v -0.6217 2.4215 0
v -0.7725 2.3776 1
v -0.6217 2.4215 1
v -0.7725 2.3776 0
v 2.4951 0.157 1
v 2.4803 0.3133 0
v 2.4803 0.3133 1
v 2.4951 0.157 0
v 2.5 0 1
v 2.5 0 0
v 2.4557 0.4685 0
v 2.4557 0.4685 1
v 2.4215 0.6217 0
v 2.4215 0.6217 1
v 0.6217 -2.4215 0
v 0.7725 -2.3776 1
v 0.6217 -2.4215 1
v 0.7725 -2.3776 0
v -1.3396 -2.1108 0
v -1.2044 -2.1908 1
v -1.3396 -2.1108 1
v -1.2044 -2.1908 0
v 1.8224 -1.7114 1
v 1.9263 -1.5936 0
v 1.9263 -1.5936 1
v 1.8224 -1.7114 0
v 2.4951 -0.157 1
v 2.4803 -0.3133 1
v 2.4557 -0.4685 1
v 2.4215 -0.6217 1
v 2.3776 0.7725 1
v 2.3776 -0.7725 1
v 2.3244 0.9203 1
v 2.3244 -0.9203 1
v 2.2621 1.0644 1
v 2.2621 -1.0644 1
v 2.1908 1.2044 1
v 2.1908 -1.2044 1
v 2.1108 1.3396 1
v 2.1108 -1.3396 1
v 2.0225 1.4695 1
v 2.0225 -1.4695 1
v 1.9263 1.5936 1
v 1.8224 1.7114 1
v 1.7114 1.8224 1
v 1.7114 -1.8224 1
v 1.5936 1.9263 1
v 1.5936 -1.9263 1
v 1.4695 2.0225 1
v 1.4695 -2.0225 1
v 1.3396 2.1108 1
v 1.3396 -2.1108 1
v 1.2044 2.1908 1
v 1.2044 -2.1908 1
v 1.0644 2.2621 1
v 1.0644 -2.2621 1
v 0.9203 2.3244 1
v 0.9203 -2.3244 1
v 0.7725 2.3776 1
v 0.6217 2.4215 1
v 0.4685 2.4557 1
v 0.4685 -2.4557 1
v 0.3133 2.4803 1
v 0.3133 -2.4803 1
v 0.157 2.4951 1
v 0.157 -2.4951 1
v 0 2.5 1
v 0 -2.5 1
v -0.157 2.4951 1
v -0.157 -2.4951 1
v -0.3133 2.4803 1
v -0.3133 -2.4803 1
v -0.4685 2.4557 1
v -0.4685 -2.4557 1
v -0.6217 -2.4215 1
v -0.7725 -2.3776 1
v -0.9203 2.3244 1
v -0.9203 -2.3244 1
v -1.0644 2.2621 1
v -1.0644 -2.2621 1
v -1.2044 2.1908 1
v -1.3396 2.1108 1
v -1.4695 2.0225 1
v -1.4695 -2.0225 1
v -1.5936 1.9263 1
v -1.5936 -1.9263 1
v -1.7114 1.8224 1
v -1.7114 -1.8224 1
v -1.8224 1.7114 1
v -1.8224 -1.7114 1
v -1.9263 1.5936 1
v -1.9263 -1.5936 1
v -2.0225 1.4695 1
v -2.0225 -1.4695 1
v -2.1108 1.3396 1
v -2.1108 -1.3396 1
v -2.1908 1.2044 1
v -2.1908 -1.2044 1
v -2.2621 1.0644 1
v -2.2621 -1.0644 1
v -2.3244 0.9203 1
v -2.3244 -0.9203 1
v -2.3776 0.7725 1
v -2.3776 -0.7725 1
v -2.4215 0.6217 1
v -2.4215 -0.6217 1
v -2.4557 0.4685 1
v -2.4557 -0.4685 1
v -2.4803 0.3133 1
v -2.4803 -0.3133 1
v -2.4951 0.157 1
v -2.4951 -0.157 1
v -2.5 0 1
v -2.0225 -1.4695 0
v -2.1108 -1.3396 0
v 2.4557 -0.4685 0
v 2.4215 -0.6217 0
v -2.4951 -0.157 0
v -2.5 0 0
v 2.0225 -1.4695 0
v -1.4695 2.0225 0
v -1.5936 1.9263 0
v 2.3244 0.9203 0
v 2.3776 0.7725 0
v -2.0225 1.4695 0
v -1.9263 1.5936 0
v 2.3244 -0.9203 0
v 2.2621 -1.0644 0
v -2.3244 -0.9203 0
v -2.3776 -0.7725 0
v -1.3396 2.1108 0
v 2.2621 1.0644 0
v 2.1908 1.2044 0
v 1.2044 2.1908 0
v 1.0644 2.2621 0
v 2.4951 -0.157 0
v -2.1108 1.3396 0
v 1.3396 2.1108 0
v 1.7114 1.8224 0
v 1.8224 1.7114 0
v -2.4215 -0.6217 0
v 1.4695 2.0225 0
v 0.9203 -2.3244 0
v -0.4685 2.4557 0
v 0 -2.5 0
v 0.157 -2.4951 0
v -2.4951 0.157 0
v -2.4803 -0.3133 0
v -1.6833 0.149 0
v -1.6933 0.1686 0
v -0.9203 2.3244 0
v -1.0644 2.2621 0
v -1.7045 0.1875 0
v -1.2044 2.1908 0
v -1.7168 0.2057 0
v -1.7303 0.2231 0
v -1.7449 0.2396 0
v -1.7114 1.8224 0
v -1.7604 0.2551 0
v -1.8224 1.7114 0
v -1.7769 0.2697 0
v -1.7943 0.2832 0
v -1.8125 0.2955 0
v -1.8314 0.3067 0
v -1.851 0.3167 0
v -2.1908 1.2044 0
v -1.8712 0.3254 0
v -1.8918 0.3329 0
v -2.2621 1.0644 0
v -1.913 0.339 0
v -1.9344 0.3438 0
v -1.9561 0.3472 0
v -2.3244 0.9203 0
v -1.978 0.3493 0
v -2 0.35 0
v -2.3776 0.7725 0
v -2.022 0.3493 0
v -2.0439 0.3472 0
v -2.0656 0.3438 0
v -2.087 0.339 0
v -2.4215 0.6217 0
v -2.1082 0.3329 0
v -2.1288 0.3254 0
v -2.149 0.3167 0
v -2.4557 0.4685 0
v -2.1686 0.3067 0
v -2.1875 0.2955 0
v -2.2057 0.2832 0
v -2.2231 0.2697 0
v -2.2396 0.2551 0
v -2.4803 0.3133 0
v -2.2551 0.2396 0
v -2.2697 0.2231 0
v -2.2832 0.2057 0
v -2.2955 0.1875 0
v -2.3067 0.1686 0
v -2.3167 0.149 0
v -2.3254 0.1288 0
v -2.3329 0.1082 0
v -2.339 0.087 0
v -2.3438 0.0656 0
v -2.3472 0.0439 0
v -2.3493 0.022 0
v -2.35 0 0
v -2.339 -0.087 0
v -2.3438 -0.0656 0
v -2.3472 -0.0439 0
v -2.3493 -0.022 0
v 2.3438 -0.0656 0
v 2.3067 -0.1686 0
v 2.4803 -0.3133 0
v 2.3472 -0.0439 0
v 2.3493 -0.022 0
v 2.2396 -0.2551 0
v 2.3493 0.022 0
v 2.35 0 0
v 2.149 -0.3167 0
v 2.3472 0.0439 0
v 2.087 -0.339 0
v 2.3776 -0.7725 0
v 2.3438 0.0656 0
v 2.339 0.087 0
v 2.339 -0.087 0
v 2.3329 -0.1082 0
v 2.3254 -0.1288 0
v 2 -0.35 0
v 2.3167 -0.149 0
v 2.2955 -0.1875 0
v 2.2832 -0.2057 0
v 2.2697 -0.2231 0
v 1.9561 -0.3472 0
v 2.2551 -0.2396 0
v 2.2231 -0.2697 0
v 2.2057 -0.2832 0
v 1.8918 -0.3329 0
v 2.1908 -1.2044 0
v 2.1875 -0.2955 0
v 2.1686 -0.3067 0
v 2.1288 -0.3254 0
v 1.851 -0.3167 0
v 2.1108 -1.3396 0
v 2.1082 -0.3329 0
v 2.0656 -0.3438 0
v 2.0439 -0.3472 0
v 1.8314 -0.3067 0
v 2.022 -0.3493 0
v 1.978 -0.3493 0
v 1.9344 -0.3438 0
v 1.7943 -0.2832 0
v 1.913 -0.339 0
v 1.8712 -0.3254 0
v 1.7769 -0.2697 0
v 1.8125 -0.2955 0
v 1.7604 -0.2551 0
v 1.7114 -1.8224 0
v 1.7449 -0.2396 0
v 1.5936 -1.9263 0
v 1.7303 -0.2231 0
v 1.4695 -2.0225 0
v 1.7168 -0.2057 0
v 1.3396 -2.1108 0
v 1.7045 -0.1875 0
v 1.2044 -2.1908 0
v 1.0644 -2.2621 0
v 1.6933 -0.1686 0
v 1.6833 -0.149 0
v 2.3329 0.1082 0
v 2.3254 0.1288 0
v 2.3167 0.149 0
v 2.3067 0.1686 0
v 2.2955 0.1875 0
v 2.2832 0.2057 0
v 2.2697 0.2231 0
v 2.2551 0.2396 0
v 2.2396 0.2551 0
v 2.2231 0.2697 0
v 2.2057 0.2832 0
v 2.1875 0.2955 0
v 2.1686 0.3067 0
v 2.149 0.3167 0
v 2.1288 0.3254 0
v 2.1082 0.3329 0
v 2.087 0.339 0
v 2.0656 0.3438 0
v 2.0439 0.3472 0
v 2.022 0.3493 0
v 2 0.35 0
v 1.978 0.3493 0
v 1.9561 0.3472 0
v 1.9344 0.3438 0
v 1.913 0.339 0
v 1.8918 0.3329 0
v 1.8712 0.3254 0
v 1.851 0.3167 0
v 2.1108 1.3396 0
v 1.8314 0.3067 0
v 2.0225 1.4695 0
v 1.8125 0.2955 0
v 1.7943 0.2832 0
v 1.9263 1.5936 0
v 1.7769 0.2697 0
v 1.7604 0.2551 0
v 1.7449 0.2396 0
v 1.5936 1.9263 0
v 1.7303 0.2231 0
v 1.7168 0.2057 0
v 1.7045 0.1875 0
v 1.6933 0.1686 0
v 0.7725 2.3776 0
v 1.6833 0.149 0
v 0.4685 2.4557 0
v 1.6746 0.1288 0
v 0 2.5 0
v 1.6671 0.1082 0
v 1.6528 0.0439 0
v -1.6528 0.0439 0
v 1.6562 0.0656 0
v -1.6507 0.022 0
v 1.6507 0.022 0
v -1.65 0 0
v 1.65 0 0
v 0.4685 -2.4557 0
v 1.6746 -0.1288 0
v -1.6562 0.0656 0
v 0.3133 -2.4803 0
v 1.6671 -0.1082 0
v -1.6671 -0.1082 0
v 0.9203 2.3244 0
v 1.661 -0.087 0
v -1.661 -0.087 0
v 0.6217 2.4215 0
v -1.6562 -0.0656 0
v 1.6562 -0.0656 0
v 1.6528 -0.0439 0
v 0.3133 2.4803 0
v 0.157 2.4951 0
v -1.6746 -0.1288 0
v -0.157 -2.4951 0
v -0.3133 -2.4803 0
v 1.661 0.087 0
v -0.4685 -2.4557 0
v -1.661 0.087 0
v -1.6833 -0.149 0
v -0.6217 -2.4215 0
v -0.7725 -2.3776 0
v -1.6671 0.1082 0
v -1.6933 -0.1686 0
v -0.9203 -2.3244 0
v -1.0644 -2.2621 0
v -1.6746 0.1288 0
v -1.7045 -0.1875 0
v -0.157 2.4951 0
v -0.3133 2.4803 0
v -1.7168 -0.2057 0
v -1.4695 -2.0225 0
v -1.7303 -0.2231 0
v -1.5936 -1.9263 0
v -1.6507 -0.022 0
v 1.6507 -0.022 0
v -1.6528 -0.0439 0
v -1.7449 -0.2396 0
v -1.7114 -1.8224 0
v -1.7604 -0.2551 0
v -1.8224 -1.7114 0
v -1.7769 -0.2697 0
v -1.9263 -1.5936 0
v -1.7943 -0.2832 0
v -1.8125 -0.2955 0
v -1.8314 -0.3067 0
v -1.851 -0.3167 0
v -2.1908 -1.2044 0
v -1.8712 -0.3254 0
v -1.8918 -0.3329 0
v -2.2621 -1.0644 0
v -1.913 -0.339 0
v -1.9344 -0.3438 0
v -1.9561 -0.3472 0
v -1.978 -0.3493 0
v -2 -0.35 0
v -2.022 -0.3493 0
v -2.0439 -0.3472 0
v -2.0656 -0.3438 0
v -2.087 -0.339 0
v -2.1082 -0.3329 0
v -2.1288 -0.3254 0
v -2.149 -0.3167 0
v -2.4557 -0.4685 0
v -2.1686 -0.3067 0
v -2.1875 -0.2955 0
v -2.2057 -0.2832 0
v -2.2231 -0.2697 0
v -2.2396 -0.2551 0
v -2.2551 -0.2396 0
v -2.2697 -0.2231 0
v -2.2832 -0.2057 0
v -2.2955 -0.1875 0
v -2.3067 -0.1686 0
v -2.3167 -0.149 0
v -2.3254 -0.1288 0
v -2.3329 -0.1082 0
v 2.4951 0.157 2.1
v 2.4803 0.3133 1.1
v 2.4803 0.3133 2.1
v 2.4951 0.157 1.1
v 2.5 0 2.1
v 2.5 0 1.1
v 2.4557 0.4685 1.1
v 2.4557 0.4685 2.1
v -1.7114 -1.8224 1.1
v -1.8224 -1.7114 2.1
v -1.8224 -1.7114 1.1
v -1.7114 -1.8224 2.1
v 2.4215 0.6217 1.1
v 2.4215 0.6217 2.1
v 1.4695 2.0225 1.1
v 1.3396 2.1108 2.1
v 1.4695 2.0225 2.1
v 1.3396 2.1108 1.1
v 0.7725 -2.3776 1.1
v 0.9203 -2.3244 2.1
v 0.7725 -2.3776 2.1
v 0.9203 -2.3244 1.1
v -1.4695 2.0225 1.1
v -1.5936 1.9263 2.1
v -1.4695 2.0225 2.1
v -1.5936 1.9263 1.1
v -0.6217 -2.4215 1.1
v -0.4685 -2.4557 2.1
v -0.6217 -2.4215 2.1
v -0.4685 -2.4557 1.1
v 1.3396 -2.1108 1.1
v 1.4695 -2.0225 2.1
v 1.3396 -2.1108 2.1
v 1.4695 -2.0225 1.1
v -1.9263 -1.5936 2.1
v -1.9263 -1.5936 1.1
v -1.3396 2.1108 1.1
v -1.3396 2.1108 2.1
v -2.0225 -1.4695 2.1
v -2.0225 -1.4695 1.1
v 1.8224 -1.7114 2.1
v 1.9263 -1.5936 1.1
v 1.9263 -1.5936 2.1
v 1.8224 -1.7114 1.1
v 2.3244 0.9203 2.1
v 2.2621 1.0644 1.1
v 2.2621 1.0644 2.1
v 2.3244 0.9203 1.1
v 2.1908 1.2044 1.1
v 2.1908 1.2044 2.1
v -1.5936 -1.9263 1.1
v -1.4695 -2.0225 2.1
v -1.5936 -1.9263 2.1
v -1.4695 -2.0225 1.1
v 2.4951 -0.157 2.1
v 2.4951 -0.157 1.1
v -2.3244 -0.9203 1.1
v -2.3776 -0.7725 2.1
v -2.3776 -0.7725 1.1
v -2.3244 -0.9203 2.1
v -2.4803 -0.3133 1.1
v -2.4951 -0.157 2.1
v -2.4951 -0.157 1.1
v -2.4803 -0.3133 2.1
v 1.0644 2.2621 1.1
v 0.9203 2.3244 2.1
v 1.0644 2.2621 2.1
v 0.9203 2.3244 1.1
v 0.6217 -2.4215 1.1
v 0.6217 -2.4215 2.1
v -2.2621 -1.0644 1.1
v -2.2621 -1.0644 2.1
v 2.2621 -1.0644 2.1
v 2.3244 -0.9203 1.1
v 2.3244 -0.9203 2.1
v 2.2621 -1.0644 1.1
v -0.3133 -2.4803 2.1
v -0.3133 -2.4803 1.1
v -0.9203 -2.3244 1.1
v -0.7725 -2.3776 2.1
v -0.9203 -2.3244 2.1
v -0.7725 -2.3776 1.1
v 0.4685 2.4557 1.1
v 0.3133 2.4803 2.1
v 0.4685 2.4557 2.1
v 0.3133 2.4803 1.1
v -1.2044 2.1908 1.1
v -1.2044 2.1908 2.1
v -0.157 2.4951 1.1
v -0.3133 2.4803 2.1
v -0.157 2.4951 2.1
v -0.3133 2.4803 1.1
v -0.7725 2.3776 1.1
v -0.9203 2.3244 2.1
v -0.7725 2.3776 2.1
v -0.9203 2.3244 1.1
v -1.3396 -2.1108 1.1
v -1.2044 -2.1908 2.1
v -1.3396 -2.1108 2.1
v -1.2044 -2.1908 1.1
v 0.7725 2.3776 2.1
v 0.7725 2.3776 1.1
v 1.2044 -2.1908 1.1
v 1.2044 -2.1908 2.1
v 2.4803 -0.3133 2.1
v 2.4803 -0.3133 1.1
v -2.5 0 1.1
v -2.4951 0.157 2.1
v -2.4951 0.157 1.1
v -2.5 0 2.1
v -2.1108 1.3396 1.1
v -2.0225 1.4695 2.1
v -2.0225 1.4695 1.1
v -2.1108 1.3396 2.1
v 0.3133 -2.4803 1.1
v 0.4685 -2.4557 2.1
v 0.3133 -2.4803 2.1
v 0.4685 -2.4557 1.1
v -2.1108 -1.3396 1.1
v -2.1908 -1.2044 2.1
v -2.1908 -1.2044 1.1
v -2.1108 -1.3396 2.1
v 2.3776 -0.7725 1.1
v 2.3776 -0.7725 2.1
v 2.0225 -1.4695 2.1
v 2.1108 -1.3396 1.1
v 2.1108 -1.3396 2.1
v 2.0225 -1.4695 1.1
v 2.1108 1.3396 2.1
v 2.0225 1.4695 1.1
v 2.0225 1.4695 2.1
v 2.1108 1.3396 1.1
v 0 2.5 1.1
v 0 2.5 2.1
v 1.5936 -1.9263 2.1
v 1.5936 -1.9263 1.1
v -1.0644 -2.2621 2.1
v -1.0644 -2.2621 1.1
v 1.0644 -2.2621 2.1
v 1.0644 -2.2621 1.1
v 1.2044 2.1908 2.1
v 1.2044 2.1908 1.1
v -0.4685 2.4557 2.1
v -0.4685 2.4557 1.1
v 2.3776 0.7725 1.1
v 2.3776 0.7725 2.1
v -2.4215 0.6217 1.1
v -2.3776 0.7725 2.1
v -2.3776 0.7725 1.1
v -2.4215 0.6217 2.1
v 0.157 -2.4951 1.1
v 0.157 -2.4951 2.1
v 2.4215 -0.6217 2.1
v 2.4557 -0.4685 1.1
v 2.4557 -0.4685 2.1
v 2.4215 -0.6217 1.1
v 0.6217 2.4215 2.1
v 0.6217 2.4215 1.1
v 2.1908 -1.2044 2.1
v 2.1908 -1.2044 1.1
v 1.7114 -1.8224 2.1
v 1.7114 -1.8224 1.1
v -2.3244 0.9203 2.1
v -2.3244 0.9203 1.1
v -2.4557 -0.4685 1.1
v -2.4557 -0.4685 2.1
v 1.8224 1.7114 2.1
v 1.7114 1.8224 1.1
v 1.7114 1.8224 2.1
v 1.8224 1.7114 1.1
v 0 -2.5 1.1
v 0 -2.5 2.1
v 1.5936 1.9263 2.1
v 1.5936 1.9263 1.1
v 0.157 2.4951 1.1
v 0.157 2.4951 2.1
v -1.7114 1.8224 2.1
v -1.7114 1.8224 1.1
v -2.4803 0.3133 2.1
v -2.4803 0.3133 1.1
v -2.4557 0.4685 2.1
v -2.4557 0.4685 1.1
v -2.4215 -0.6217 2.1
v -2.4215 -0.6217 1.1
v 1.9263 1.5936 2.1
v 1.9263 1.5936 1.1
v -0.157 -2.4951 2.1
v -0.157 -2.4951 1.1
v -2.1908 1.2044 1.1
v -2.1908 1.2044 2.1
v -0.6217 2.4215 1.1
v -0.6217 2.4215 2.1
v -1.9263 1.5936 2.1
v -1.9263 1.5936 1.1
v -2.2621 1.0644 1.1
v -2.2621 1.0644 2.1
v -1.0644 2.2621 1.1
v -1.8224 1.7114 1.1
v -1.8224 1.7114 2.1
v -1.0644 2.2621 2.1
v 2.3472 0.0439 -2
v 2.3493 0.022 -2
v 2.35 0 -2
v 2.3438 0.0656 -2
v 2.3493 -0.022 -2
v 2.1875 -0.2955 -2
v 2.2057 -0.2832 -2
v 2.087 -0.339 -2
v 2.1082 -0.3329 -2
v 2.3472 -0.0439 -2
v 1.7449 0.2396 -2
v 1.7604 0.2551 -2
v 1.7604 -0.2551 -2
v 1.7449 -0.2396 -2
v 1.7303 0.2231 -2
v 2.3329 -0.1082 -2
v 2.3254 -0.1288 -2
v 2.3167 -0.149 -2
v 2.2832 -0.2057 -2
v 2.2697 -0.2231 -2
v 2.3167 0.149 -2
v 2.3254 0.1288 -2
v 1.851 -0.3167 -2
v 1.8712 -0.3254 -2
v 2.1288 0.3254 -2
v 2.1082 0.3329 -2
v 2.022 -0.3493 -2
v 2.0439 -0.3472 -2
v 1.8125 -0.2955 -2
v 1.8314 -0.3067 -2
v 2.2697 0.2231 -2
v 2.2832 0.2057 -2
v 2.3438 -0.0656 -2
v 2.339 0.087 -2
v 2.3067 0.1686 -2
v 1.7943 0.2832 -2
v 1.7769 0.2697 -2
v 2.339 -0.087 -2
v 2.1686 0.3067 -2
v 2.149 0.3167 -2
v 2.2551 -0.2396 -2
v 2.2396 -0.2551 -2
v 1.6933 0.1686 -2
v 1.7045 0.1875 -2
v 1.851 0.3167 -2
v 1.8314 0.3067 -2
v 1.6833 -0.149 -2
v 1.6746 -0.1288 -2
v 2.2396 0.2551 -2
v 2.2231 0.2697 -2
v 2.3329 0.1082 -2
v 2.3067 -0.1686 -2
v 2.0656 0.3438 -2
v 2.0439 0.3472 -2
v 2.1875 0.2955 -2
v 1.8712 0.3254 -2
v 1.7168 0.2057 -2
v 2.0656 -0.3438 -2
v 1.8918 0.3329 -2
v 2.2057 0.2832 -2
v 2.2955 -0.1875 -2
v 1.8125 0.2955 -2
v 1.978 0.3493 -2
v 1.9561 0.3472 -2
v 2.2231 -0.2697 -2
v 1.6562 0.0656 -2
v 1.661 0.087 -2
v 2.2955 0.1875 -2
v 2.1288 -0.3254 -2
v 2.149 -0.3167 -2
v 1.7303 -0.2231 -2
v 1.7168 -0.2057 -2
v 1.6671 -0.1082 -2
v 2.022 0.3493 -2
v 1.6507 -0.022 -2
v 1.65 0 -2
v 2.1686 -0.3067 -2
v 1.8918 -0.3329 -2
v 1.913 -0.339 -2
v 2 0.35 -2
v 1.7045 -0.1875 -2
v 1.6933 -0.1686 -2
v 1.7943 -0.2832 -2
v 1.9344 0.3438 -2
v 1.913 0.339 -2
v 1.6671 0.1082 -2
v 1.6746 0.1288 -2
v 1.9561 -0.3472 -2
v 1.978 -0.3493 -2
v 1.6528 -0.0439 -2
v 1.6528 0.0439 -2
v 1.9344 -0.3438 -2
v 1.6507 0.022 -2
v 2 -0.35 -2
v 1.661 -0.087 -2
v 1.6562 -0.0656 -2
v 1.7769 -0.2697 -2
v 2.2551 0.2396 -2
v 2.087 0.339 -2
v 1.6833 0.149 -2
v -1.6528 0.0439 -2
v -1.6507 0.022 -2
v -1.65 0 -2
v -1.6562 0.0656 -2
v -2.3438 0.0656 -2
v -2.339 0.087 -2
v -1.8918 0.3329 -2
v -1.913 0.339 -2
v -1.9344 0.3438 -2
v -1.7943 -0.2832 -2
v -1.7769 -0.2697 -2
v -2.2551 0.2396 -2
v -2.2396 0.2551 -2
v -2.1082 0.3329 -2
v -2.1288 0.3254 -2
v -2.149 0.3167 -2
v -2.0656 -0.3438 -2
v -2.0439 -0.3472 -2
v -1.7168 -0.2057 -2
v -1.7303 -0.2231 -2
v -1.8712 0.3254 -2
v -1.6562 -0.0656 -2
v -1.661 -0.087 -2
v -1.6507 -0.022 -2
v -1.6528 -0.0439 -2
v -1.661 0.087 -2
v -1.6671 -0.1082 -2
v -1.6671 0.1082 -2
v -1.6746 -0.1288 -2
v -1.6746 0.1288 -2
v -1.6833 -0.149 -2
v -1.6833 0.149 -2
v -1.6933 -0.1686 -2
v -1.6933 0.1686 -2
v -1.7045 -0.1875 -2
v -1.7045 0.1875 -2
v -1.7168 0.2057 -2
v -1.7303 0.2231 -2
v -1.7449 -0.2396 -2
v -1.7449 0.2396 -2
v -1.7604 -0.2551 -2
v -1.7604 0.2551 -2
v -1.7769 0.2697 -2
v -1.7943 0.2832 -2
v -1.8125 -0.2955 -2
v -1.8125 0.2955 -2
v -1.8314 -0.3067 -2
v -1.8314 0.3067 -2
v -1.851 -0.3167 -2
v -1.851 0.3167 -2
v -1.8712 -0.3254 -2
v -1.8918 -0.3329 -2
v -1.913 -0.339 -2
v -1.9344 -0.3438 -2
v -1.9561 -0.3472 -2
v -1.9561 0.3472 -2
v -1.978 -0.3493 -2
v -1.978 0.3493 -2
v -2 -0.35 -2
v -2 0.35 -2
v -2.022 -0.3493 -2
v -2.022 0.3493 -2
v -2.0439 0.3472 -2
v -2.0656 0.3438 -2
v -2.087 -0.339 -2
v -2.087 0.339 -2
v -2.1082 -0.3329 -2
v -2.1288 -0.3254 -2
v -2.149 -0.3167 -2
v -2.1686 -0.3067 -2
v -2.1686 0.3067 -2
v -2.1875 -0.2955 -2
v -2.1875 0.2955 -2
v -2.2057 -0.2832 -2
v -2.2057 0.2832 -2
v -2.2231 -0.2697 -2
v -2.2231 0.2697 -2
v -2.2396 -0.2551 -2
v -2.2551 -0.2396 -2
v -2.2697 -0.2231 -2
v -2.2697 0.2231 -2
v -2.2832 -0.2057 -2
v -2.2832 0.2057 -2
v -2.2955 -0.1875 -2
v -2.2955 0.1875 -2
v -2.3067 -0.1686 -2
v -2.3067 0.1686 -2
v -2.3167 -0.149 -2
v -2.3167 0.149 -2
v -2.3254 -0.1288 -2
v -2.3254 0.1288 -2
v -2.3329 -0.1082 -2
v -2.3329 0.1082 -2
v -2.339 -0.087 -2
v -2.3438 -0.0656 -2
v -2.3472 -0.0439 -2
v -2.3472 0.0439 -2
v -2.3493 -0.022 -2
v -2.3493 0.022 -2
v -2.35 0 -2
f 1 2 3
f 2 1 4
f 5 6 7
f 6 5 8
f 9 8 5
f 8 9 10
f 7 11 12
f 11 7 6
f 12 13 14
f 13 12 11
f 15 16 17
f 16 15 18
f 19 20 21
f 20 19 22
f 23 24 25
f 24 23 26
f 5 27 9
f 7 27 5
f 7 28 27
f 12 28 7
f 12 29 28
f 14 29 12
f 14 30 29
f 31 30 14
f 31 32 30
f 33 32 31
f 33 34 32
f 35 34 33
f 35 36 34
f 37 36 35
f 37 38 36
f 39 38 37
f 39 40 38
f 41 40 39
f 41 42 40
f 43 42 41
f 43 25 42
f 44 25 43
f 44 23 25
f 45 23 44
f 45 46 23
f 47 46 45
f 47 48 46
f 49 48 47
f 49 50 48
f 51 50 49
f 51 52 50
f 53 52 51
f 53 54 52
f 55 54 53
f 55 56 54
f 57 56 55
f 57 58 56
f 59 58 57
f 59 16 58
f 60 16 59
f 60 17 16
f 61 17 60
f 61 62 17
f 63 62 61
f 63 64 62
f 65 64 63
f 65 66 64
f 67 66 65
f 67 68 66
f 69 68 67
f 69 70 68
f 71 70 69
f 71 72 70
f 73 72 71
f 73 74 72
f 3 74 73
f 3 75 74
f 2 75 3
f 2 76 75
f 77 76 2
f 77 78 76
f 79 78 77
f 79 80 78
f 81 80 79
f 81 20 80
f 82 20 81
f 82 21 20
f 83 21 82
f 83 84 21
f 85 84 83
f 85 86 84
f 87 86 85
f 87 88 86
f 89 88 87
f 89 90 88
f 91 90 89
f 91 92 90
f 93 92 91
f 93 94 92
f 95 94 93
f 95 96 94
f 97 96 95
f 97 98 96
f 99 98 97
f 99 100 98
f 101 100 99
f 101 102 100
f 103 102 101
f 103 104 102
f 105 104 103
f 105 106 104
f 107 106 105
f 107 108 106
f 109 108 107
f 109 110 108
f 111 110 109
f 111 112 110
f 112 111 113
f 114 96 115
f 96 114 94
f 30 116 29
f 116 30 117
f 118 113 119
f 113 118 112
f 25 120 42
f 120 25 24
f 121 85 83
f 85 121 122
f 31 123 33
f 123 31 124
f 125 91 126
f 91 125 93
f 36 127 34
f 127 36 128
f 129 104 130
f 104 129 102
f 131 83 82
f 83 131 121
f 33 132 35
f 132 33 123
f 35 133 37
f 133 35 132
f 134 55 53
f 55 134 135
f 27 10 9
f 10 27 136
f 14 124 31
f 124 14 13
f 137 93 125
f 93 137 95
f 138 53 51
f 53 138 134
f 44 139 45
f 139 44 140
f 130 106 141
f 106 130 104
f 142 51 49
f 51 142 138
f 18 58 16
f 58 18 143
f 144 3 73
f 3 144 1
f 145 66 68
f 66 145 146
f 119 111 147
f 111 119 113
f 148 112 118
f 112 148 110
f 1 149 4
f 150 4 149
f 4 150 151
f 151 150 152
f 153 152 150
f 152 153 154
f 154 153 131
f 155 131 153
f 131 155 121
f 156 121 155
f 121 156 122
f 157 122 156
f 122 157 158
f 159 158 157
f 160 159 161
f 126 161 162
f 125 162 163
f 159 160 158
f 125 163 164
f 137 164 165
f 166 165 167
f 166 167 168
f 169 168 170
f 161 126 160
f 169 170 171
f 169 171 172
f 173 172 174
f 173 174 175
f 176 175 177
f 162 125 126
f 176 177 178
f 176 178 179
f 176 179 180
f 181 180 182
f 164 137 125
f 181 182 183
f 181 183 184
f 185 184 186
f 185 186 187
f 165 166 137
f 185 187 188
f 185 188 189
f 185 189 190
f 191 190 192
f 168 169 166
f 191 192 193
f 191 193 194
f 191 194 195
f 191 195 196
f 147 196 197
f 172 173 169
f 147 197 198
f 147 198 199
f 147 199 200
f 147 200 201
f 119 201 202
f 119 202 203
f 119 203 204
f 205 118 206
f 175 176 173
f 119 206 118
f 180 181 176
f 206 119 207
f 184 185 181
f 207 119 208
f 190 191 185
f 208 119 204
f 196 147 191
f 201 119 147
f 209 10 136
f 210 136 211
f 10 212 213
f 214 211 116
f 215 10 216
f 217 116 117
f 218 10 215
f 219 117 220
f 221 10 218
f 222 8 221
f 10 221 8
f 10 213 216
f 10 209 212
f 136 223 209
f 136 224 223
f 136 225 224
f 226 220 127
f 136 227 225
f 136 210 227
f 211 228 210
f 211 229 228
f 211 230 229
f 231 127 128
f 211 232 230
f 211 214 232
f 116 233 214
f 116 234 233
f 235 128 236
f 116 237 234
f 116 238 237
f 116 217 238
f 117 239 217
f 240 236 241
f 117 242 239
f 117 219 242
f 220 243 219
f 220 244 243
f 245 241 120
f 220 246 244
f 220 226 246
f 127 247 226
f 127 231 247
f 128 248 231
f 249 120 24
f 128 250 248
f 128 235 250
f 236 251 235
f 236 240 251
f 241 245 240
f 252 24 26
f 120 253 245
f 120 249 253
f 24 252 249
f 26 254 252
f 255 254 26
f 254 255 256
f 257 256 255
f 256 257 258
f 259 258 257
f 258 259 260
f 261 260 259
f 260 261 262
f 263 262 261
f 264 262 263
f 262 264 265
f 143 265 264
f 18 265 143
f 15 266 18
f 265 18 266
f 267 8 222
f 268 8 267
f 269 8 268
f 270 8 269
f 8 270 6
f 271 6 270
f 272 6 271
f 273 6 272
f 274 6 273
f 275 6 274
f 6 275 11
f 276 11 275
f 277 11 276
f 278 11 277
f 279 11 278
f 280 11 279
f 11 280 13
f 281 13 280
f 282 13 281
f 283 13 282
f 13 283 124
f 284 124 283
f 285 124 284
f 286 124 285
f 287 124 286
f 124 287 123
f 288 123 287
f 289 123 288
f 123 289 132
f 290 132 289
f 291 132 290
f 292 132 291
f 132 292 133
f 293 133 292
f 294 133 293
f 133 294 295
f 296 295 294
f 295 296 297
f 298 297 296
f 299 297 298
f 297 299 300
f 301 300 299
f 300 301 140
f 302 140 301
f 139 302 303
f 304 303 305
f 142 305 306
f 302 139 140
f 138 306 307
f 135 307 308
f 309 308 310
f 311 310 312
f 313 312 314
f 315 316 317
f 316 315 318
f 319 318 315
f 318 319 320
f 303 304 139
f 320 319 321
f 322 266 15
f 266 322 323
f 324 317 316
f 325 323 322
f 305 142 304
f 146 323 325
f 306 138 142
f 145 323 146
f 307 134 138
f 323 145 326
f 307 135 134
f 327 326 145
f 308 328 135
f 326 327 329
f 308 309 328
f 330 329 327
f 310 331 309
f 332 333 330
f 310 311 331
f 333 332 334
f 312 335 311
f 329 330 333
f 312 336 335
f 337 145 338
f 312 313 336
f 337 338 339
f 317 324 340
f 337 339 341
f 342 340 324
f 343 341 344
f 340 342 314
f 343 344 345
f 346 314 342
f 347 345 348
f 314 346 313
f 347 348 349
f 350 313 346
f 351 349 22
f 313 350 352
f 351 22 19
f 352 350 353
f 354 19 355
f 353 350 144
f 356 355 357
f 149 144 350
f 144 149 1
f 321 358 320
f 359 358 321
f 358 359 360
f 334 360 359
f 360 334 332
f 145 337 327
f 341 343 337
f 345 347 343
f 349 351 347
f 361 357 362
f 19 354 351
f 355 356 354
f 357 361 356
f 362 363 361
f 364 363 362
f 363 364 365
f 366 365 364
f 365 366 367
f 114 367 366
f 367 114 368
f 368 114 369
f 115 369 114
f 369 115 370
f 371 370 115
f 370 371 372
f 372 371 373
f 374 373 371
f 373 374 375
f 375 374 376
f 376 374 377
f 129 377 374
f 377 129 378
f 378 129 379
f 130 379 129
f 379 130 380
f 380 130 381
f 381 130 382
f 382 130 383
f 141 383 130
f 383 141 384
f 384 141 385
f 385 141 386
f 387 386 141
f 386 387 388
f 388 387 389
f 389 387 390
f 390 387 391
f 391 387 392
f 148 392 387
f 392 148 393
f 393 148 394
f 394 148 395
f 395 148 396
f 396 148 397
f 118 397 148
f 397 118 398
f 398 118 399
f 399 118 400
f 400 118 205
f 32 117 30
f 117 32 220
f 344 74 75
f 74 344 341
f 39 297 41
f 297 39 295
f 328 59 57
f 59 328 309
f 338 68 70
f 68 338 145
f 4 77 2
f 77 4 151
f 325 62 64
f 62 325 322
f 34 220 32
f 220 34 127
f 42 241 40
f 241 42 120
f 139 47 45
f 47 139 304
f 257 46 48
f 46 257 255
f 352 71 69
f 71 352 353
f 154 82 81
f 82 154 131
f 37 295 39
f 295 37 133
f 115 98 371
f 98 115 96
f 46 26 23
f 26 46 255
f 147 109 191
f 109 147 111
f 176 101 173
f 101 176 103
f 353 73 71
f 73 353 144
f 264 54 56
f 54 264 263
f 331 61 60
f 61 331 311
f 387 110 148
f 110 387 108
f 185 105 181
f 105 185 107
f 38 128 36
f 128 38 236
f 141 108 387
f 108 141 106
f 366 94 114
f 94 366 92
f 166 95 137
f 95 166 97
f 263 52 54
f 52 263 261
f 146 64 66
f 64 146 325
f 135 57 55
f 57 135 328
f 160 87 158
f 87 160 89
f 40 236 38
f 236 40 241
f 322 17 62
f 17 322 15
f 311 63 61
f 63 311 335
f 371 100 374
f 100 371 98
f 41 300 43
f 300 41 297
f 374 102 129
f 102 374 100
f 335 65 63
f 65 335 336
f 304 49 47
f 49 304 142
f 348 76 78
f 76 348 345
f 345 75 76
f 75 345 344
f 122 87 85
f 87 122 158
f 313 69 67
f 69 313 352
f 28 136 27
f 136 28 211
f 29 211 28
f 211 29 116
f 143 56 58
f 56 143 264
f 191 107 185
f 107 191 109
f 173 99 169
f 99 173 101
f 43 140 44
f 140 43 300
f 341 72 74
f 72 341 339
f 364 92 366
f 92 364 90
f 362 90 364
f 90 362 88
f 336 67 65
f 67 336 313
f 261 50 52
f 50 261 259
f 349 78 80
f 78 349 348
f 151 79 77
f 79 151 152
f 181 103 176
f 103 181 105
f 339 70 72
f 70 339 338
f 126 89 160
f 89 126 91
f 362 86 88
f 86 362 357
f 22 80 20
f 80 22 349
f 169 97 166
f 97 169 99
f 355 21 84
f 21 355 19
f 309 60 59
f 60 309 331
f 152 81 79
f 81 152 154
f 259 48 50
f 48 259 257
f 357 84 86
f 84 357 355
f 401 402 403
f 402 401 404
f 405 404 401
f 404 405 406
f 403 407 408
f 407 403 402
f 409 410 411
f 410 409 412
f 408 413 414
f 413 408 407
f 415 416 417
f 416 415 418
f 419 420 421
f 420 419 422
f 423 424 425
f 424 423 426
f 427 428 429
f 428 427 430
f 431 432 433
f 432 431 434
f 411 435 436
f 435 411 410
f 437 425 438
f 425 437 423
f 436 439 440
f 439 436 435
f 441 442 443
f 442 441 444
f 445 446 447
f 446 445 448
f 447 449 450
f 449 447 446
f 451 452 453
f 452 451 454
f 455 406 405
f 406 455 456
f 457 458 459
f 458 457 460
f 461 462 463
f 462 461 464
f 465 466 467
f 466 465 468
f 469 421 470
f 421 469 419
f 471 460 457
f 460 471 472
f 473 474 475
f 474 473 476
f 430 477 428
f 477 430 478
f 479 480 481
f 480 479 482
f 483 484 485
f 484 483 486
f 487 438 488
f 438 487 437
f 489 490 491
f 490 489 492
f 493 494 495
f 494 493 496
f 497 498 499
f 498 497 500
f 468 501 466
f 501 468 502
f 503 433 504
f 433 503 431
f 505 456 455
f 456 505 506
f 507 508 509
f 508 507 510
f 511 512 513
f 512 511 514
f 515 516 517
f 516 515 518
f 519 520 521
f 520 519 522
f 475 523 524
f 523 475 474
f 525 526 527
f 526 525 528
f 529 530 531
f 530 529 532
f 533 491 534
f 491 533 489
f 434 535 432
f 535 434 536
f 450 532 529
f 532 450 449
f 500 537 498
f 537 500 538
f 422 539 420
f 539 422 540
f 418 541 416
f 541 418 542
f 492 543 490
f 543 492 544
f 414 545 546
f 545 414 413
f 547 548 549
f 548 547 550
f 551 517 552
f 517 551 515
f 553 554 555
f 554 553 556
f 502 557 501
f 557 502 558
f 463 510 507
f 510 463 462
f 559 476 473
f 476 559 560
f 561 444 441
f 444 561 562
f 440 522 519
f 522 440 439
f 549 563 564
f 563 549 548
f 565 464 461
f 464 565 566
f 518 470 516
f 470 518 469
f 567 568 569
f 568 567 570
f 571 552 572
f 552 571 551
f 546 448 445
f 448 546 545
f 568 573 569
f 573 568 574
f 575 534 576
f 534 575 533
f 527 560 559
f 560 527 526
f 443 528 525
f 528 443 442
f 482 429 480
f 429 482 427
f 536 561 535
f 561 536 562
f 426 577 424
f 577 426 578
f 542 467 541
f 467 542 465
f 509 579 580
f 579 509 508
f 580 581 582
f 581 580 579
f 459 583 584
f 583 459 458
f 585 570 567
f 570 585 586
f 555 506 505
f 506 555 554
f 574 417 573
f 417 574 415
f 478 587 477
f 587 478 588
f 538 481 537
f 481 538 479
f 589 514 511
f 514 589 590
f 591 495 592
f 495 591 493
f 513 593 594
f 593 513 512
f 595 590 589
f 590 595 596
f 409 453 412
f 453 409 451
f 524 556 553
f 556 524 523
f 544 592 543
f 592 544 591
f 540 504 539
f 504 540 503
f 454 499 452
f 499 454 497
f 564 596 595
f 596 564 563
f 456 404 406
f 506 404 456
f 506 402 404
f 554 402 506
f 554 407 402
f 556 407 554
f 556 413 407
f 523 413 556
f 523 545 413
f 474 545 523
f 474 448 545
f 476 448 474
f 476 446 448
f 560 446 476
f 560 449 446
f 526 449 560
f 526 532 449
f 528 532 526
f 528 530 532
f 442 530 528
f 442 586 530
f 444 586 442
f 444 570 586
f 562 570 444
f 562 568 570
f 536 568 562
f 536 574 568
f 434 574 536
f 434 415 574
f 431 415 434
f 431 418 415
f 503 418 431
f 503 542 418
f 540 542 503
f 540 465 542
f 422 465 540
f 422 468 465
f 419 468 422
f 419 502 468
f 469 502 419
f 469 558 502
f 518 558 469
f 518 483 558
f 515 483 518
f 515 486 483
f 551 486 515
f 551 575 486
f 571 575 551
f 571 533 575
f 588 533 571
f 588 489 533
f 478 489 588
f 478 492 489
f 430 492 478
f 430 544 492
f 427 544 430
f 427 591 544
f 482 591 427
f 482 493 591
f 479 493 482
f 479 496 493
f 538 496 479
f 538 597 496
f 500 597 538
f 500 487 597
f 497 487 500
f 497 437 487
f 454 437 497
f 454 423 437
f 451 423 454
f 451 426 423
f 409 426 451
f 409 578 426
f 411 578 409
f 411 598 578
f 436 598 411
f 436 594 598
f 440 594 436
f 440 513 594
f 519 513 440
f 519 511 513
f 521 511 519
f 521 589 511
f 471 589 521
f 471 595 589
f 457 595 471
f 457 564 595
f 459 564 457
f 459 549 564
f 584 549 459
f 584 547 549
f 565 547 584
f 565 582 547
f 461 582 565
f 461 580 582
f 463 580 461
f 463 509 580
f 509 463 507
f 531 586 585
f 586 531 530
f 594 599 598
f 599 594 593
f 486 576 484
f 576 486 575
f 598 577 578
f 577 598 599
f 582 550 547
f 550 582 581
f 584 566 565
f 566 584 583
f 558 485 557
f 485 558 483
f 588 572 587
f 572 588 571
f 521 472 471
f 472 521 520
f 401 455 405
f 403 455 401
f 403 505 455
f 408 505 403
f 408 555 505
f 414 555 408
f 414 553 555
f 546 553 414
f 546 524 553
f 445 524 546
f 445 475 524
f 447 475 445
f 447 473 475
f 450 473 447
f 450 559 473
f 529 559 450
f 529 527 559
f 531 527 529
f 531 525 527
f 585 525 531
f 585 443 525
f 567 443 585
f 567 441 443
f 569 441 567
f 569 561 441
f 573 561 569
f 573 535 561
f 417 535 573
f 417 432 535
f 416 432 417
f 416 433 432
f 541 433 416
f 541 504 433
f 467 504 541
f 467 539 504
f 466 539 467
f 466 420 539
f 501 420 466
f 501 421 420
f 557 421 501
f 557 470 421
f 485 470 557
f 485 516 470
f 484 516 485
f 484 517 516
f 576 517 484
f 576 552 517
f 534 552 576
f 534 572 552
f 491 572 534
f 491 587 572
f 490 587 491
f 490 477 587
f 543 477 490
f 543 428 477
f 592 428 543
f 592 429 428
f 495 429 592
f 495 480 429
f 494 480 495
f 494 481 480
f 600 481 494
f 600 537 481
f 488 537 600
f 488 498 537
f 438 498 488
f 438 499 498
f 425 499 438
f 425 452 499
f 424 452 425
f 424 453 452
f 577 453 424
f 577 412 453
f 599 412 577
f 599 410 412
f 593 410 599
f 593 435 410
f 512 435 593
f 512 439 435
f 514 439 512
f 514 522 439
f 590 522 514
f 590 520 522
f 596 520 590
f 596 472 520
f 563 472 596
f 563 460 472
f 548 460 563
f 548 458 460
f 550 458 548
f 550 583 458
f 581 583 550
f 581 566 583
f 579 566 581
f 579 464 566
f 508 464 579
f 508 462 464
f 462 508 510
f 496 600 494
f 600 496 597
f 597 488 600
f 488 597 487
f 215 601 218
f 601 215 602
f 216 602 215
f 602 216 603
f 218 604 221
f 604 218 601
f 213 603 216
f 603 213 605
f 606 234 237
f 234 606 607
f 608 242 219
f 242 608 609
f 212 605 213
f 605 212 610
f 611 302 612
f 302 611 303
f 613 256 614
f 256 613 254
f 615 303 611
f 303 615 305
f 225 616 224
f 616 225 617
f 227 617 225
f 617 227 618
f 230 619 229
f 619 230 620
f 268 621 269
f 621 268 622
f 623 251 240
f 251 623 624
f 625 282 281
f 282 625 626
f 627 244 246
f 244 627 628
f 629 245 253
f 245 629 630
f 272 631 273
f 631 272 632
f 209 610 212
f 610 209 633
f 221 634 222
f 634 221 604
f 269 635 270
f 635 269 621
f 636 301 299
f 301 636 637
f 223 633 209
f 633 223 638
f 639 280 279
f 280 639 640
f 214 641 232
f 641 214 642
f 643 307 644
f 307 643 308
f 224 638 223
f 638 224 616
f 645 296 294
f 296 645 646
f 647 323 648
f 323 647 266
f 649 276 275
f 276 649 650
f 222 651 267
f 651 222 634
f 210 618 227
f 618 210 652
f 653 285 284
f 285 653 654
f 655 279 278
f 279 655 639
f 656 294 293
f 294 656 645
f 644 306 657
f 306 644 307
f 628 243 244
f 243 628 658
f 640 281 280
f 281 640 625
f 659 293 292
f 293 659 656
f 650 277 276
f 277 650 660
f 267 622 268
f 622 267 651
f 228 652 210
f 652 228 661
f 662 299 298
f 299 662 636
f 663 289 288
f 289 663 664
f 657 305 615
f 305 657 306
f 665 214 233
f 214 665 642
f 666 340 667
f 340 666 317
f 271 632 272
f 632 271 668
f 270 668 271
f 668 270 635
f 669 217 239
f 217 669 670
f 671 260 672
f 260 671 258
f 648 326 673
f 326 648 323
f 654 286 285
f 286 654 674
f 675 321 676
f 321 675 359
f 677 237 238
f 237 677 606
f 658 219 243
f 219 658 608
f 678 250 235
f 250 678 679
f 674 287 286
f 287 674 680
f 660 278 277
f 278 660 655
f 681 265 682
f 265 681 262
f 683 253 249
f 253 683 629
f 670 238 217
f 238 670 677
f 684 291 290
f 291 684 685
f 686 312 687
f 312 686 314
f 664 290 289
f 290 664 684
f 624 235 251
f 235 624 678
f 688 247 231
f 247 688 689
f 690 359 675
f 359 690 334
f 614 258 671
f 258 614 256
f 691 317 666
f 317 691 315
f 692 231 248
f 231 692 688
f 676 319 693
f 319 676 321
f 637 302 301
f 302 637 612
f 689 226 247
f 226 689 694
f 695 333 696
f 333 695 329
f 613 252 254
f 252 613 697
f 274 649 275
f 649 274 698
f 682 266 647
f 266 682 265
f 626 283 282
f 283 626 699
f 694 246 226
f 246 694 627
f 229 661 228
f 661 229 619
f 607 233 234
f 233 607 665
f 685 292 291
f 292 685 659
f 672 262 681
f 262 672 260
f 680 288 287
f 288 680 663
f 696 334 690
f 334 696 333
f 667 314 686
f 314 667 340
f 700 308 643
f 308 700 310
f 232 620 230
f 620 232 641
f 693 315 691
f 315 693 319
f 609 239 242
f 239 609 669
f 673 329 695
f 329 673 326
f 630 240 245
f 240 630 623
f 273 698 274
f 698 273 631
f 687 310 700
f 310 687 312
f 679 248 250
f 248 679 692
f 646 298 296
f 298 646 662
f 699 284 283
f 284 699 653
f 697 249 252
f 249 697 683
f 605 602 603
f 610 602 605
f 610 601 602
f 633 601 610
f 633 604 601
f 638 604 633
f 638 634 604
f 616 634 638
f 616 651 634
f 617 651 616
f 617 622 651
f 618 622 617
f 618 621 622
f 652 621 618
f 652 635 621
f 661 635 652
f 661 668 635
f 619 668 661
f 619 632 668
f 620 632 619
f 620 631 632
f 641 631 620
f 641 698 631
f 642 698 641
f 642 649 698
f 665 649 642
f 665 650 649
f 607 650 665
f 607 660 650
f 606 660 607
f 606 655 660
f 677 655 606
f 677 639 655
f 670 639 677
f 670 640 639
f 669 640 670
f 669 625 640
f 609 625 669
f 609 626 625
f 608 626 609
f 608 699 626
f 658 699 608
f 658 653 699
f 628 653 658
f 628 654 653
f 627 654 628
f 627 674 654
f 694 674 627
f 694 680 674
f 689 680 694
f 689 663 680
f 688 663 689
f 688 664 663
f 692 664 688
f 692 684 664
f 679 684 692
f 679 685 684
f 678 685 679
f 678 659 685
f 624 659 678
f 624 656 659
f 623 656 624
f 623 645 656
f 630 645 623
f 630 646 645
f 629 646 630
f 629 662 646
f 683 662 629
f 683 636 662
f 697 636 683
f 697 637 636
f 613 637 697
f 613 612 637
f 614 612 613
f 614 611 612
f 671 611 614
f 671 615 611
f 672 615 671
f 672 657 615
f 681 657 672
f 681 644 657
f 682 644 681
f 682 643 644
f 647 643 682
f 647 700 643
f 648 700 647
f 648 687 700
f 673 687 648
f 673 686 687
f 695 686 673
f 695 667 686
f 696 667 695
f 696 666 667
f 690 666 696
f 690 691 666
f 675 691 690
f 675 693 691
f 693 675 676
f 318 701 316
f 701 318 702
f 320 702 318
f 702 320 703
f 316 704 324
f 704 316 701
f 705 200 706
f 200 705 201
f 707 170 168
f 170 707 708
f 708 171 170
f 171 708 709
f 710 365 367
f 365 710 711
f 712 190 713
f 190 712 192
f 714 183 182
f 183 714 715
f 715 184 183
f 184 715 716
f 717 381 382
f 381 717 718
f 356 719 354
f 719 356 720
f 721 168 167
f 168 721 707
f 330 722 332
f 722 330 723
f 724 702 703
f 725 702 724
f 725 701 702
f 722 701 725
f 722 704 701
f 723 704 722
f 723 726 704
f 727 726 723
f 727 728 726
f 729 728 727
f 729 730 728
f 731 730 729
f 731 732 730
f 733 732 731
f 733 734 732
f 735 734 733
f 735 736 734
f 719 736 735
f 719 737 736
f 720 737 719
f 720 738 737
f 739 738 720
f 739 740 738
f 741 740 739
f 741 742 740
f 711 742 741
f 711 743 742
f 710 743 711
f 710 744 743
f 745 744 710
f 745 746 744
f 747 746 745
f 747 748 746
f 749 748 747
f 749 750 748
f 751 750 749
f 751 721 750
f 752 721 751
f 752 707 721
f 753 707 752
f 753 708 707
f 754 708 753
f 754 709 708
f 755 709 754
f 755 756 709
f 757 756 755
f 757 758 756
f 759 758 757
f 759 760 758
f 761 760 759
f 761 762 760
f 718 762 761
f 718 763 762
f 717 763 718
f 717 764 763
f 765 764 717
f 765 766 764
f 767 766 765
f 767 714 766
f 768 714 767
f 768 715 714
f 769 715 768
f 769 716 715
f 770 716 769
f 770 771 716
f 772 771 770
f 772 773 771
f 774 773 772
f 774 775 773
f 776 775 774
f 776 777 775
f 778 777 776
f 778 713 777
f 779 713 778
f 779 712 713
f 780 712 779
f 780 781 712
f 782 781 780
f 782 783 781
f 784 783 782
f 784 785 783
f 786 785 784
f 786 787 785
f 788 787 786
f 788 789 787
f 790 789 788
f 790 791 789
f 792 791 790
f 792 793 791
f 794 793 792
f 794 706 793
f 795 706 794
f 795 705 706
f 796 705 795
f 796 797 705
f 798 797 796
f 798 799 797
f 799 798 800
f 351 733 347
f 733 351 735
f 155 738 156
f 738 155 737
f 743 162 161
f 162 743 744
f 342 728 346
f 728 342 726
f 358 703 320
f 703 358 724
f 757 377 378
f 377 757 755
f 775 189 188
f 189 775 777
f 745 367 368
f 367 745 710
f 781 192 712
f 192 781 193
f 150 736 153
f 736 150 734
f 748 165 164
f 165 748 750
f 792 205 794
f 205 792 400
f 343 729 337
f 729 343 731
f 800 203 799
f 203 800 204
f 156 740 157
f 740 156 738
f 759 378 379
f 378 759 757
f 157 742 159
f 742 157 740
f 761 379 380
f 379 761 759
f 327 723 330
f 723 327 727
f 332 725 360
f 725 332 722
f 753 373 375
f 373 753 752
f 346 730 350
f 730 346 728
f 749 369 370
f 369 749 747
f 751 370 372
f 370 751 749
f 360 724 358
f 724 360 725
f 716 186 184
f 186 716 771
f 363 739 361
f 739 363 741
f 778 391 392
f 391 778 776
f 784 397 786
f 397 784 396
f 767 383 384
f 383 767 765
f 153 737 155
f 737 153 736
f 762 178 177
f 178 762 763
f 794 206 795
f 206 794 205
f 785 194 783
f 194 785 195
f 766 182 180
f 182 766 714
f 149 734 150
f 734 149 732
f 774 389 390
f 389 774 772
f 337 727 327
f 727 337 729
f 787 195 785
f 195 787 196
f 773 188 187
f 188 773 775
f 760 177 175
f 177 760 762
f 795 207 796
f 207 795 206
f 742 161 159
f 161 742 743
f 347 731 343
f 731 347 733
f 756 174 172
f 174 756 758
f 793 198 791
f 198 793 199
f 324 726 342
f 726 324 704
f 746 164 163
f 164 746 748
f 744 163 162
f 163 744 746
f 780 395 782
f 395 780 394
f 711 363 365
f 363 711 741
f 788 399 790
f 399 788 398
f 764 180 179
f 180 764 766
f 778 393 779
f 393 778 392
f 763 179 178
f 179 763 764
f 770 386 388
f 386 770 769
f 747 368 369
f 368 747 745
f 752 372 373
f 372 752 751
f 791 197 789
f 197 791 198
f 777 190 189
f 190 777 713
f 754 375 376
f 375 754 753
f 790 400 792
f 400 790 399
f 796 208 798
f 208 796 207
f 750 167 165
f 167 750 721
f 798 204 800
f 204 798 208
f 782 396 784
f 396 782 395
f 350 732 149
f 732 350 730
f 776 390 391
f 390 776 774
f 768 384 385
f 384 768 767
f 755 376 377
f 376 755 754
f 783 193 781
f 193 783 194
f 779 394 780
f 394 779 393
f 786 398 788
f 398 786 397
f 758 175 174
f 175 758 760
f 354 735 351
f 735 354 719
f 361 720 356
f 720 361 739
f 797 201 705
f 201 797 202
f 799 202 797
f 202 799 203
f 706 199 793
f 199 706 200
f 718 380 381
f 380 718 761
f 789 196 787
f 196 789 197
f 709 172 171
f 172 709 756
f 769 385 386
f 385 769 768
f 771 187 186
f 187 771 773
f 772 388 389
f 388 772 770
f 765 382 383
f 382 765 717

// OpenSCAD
/* 
	Supplemental Valve 5

*/

$fn = 100; // increase the smoothness of the cylinders

// Define the dimensions
chamber_diameter = 5; // Diameter of both chambers
membrane_thickness = 0.1; // 100 microns
chamber_height = 1; // Height of each chamber
port_diameter = 0.7; // Diameter of the ports
port_offset = 2; // X Offset of the ports
port_height = 2; // Height of the ports

// Draw the fluid chamber
cylinder(h=chamber_height, d=chamber_diameter);

// Draw the pneumatic chamber with membrane
translate([0, 0, chamber_height + membrane_thickness])
    cylinder(h=chamber_height, d=chamber_diameter);

// Draw the two offset ports
translate([port_offset, 0, -port_height])
    cylinder(h=port_height, d=port_diameter);

translate([-port_offset, 0, -port_height])
    cylinder(h=port_height, d=port_diameter);
